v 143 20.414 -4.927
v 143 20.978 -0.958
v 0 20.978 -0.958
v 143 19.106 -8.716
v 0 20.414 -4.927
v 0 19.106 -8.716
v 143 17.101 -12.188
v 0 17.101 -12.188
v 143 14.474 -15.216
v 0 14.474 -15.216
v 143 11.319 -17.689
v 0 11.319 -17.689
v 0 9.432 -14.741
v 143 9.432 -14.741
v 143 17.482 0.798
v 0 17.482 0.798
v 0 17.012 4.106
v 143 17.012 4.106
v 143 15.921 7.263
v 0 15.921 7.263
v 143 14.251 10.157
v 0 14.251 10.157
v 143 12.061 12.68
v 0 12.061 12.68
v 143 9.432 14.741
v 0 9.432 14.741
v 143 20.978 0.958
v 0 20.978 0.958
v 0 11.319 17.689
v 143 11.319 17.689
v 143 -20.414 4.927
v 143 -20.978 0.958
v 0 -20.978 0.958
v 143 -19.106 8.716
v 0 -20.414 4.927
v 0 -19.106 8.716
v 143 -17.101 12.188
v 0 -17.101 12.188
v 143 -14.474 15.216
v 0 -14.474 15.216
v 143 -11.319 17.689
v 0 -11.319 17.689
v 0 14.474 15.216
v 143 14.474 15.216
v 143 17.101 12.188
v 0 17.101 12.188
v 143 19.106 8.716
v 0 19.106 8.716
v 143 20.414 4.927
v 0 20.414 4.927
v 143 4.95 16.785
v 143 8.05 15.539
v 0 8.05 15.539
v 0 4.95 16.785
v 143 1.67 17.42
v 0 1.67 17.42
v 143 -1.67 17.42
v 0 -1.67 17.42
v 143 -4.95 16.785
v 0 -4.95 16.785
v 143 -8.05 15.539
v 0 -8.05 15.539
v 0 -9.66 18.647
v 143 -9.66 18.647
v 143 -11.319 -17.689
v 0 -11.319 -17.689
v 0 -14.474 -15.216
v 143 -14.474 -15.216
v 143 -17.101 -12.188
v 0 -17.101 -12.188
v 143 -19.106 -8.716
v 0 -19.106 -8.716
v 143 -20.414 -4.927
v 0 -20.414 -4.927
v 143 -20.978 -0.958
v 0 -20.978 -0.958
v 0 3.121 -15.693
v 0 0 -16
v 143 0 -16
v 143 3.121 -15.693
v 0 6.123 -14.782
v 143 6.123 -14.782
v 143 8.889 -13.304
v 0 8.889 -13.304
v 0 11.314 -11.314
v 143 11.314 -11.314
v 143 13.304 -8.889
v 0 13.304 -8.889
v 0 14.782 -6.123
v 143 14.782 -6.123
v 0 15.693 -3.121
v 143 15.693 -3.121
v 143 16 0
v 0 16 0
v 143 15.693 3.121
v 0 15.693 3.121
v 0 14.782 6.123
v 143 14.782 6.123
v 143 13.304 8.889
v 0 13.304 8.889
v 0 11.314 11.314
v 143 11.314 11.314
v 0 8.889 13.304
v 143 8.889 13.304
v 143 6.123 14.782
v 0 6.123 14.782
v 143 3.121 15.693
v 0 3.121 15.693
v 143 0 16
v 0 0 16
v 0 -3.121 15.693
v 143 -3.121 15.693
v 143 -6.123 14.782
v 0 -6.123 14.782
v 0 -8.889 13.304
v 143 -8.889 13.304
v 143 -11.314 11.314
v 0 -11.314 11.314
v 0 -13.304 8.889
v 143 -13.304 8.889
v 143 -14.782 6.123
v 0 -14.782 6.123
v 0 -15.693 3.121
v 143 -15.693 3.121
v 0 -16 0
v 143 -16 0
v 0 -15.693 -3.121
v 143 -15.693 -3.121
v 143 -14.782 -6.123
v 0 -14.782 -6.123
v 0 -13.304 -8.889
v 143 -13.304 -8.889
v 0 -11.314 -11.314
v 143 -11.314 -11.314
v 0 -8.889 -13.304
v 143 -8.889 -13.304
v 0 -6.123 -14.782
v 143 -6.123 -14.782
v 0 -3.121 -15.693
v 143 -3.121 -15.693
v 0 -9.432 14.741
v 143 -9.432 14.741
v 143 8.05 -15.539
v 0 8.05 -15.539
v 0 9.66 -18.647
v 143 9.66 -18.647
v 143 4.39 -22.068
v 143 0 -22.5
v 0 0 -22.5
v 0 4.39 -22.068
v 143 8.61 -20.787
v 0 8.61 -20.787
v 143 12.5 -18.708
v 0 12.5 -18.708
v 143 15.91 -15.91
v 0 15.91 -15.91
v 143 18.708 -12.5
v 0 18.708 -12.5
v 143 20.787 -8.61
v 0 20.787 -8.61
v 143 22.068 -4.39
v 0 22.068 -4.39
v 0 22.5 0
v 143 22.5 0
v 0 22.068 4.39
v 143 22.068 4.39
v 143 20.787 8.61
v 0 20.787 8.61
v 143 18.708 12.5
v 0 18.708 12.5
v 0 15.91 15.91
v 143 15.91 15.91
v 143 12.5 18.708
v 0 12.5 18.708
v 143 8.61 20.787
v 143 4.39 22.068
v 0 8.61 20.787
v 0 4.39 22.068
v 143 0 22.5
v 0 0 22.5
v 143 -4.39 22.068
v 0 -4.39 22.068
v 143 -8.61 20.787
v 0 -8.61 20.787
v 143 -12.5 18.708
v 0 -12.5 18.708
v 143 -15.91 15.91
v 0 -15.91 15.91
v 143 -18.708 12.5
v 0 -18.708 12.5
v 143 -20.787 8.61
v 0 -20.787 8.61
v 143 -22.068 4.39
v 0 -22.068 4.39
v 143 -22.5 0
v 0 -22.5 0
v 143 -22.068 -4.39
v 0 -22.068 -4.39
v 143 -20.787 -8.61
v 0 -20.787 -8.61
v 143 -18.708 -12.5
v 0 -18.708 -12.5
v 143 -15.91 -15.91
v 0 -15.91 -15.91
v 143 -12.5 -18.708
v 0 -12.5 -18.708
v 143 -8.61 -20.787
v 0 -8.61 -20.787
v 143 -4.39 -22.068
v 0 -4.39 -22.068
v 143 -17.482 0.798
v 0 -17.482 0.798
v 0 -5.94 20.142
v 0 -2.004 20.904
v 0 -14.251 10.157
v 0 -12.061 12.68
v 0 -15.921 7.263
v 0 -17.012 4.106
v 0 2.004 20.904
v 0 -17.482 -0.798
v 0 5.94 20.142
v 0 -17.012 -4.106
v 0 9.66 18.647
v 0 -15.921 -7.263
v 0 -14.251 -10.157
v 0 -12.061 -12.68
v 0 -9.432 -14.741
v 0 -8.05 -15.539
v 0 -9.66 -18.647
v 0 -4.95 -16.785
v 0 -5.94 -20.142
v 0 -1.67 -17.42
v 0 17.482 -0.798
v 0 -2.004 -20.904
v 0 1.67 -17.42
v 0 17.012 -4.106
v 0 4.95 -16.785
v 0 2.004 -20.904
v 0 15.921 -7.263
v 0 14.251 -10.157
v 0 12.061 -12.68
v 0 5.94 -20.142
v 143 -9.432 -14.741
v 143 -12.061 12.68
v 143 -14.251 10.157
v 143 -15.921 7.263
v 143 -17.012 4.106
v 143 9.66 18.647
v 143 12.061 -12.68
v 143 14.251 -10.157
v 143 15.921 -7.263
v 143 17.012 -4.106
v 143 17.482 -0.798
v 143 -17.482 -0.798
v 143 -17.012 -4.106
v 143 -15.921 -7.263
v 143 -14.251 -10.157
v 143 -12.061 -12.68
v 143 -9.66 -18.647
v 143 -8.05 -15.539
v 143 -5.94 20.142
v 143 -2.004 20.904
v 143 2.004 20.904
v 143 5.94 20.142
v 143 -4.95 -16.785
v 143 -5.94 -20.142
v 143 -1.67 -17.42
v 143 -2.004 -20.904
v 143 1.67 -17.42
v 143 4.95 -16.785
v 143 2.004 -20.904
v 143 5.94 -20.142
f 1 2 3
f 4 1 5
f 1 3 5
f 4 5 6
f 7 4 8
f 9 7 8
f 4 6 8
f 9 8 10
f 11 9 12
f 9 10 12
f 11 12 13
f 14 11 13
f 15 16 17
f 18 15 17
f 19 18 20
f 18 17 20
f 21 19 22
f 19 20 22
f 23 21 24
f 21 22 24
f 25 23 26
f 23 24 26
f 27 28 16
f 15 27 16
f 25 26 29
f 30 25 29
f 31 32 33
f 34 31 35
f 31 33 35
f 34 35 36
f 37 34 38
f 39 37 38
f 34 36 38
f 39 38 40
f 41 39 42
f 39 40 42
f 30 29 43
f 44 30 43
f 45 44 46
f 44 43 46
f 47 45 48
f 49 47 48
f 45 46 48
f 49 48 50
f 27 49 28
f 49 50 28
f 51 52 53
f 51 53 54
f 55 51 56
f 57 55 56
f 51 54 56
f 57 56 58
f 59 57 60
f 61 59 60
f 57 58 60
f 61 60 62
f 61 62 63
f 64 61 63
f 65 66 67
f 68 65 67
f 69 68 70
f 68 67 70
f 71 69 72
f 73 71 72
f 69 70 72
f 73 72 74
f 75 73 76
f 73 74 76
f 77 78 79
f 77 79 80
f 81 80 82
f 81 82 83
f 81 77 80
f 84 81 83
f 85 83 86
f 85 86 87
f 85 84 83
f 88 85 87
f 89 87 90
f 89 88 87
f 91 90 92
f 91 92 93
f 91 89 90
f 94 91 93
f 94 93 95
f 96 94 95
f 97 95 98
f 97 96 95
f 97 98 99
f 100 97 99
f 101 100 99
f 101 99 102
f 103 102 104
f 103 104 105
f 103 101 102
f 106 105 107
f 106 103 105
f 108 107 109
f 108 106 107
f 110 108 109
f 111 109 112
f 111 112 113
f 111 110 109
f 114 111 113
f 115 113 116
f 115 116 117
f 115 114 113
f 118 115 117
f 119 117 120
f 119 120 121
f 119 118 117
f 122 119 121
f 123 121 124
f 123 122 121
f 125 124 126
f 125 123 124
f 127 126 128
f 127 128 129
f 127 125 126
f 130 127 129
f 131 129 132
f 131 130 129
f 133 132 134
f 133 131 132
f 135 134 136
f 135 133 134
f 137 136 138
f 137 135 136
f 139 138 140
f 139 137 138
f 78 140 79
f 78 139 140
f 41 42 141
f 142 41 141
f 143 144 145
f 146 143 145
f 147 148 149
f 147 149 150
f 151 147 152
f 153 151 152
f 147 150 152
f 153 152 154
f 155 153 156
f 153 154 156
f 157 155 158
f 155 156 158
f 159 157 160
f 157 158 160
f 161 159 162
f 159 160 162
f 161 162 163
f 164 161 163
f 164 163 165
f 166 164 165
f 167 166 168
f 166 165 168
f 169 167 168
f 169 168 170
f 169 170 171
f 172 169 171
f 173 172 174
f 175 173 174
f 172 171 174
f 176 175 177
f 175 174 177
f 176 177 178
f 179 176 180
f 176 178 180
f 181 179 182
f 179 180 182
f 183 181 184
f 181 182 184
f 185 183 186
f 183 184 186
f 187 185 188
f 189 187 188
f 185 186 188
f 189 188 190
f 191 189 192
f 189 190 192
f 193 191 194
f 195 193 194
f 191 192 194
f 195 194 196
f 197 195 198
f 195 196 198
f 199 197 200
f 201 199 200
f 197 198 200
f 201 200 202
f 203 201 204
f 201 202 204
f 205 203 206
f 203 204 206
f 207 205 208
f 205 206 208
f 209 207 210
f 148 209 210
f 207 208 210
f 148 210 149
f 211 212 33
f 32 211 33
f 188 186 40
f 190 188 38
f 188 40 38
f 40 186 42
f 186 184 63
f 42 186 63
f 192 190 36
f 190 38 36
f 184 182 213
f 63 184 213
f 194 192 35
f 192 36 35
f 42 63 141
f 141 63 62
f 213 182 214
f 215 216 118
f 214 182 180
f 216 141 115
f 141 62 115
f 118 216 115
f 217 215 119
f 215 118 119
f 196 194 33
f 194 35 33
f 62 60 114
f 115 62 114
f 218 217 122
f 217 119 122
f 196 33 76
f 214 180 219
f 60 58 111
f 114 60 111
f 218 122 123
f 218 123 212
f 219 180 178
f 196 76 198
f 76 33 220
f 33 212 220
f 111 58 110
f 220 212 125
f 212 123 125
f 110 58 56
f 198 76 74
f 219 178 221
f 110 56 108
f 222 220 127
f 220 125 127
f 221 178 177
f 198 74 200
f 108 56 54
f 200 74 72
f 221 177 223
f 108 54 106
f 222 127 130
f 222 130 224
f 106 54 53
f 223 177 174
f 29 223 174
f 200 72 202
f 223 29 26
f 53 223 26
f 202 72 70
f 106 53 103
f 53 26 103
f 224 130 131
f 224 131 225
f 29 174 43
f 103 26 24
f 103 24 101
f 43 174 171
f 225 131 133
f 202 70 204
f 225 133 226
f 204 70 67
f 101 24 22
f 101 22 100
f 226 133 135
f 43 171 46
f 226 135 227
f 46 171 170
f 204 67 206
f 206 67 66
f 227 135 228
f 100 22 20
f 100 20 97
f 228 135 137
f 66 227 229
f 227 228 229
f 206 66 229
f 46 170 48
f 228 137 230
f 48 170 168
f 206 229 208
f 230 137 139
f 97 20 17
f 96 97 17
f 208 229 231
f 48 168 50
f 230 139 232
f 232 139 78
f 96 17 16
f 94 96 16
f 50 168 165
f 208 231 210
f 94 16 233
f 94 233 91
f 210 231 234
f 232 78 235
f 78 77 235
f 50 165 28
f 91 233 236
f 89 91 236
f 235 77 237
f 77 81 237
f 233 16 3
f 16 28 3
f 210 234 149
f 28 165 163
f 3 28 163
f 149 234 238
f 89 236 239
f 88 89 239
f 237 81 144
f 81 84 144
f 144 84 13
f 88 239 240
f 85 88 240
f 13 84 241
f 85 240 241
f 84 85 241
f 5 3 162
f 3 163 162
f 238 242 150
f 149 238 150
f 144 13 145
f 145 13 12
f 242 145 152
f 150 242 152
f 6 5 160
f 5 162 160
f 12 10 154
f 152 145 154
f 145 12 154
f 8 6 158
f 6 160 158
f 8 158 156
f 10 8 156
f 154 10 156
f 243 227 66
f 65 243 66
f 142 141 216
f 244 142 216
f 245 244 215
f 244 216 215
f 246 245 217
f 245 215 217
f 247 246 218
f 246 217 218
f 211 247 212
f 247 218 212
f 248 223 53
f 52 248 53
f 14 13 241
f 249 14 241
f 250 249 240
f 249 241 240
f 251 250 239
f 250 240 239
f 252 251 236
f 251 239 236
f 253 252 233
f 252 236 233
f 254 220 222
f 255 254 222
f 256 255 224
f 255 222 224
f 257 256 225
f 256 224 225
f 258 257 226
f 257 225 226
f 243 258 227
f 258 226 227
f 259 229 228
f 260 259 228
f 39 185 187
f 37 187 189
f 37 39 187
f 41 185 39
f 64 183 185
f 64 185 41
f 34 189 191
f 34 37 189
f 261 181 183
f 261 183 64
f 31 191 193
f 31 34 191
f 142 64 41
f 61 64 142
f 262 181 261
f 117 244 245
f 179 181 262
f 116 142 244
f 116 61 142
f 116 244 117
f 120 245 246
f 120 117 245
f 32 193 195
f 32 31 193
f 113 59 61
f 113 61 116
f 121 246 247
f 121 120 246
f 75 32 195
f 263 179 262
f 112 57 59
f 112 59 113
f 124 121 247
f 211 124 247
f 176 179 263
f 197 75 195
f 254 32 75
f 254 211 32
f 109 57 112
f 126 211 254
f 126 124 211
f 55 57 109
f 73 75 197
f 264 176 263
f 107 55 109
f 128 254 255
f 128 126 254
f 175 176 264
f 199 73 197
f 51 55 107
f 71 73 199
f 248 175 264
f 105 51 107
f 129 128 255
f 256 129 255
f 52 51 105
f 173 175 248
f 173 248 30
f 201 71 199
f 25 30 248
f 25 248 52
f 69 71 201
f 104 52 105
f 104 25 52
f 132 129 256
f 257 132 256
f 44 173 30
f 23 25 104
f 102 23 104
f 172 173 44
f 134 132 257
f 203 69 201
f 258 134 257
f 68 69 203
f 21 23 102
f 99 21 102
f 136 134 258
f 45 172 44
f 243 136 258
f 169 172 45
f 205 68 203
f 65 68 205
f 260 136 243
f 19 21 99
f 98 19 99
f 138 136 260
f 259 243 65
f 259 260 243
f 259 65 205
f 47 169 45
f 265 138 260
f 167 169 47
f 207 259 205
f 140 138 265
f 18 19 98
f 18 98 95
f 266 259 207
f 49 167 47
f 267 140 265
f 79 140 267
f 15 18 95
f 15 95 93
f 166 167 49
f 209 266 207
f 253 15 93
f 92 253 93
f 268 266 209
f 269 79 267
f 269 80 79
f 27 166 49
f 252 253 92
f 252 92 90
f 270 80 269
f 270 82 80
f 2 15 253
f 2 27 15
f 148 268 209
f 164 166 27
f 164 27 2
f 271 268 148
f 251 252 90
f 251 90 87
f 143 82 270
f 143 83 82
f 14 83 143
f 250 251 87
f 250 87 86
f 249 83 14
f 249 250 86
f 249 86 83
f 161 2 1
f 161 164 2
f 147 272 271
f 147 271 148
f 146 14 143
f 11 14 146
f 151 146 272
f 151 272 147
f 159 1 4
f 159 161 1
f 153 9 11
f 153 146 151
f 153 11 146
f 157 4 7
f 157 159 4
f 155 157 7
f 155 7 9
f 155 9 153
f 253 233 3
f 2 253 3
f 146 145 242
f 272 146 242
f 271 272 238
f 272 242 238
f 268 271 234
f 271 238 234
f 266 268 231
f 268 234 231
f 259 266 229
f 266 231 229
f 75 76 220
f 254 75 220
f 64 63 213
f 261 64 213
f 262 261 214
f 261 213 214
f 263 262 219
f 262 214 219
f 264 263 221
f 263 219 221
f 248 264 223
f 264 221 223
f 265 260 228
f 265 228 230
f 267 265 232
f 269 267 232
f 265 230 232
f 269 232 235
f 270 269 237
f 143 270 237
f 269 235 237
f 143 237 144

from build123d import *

# Parameters (mm, degrees)
SKETCH1_R           = 22.5
SKETCH1_R_2         = 16
BOSS_EXTRUDE1_DEPTH = 143


with BuildPart() as part:
    # Sketch1 → Boss-Extrude1 (new body)
    with BuildSketch(Plane(origin=(0, 0, 0), x_dir=(0, 0, -1), z_dir=(1, 0, 0))):
        Circle(SKETCH1_R)
        with BuildLine():
            ThreePointArc((0.798223616, -17.481785923), (8.75, -15.155444566), (14.740558905, -9.432174891))
            Line((14.740558905, -9.432174891), (17.688670686, -11.318609869))
            ThreePointArc((17.688670686, -11.318609869), (10.5, -18.186533479), (0.95786834, -20.978143108))
            Line((0.95786834, -20.978143108), (0.798223616, -17.481785923))
        make_face(mode=Mode.SUBTRACT)
        with BuildLine():
            Line((18.646539025, -9.659533238), (15.538782521, -8.049611032))
            ThreePointArc((15.538782521, -8.049611032), (17.5, 0), (15.538782521, 8.049611032))
            Line((15.538782521, 8.049611032), (18.646539025, 9.659533238))
            ThreePointArc((18.646539025, 9.659533238), (21, 0), (18.646539025, -9.659533238))
        make_face(mode=Mode.SUBTRACT)
        with BuildLine():
            Line((-0.798223616, -17.481785923), (-0.95786834, -20.978143108))
            ThreePointArc((-0.95786834, -20.978143108), (-10.5, -18.186533479), (-17.688670686, -11.318609869))
            Line((-17.688670686, -11.318609869), (-14.740558905, -9.432174891))
            ThreePointArc((-14.740558905, -9.432174891), (-8.75, -15.155444566), (-0.798223616, -17.481785923))
        make_face(mode=Mode.SUBTRACT)
        with BuildLine():
            Line((17.688670686, 11.318609869), (14.740558905, 9.432174891))
            ThreePointArc((14.740558905, 9.432174891), (8.75, 15.155444566), (0.798223616, 17.481785923))
            Line((0.798223616, 17.481785923), (0.95786834, 20.978143108))
            ThreePointArc((0.95786834, 20.978143108), (10.5, 18.186533479), (17.688670686, 11.318609869))
        make_face(mode=Mode.SUBTRACT)
        with BuildLine():
            Line((-15.538782521, -8.049611032), (-18.646539025, -9.659533238))
            ThreePointArc((-18.646539025, -9.659533238), (-21, 0), (-18.646539025, 9.659533238))
            Line((-18.646539025, 9.659533238), (-15.538782521, 8.049611032))
            ThreePointArc((-15.538782521, 8.049611032), (-17.5, 0), (-15.538782521, -8.049611032))
        make_face(mode=Mode.SUBTRACT)
        with BuildLine():
            Line((-0.95786834, 20.978143108), (-0.798223616, 17.481785923))
            ThreePointArc((-0.798223616, 17.481785923), (-8.75, 15.155444566), (-14.740558905, 9.432174891))
            Line((-14.740558905, 9.432174891), (-17.688670686, 11.318609869))
            ThreePointArc((-17.688670686, 11.318609869), (-10.5, 18.186533479), (-0.95786834, 20.978143108))
        make_face(mode=Mode.SUBTRACT)
        Circle(SKETCH1_R_2, mode=Mode.SUBTRACT)
    extrude(amount=BOSS_EXTRUDE1_DEPTH)


solid = part.part
